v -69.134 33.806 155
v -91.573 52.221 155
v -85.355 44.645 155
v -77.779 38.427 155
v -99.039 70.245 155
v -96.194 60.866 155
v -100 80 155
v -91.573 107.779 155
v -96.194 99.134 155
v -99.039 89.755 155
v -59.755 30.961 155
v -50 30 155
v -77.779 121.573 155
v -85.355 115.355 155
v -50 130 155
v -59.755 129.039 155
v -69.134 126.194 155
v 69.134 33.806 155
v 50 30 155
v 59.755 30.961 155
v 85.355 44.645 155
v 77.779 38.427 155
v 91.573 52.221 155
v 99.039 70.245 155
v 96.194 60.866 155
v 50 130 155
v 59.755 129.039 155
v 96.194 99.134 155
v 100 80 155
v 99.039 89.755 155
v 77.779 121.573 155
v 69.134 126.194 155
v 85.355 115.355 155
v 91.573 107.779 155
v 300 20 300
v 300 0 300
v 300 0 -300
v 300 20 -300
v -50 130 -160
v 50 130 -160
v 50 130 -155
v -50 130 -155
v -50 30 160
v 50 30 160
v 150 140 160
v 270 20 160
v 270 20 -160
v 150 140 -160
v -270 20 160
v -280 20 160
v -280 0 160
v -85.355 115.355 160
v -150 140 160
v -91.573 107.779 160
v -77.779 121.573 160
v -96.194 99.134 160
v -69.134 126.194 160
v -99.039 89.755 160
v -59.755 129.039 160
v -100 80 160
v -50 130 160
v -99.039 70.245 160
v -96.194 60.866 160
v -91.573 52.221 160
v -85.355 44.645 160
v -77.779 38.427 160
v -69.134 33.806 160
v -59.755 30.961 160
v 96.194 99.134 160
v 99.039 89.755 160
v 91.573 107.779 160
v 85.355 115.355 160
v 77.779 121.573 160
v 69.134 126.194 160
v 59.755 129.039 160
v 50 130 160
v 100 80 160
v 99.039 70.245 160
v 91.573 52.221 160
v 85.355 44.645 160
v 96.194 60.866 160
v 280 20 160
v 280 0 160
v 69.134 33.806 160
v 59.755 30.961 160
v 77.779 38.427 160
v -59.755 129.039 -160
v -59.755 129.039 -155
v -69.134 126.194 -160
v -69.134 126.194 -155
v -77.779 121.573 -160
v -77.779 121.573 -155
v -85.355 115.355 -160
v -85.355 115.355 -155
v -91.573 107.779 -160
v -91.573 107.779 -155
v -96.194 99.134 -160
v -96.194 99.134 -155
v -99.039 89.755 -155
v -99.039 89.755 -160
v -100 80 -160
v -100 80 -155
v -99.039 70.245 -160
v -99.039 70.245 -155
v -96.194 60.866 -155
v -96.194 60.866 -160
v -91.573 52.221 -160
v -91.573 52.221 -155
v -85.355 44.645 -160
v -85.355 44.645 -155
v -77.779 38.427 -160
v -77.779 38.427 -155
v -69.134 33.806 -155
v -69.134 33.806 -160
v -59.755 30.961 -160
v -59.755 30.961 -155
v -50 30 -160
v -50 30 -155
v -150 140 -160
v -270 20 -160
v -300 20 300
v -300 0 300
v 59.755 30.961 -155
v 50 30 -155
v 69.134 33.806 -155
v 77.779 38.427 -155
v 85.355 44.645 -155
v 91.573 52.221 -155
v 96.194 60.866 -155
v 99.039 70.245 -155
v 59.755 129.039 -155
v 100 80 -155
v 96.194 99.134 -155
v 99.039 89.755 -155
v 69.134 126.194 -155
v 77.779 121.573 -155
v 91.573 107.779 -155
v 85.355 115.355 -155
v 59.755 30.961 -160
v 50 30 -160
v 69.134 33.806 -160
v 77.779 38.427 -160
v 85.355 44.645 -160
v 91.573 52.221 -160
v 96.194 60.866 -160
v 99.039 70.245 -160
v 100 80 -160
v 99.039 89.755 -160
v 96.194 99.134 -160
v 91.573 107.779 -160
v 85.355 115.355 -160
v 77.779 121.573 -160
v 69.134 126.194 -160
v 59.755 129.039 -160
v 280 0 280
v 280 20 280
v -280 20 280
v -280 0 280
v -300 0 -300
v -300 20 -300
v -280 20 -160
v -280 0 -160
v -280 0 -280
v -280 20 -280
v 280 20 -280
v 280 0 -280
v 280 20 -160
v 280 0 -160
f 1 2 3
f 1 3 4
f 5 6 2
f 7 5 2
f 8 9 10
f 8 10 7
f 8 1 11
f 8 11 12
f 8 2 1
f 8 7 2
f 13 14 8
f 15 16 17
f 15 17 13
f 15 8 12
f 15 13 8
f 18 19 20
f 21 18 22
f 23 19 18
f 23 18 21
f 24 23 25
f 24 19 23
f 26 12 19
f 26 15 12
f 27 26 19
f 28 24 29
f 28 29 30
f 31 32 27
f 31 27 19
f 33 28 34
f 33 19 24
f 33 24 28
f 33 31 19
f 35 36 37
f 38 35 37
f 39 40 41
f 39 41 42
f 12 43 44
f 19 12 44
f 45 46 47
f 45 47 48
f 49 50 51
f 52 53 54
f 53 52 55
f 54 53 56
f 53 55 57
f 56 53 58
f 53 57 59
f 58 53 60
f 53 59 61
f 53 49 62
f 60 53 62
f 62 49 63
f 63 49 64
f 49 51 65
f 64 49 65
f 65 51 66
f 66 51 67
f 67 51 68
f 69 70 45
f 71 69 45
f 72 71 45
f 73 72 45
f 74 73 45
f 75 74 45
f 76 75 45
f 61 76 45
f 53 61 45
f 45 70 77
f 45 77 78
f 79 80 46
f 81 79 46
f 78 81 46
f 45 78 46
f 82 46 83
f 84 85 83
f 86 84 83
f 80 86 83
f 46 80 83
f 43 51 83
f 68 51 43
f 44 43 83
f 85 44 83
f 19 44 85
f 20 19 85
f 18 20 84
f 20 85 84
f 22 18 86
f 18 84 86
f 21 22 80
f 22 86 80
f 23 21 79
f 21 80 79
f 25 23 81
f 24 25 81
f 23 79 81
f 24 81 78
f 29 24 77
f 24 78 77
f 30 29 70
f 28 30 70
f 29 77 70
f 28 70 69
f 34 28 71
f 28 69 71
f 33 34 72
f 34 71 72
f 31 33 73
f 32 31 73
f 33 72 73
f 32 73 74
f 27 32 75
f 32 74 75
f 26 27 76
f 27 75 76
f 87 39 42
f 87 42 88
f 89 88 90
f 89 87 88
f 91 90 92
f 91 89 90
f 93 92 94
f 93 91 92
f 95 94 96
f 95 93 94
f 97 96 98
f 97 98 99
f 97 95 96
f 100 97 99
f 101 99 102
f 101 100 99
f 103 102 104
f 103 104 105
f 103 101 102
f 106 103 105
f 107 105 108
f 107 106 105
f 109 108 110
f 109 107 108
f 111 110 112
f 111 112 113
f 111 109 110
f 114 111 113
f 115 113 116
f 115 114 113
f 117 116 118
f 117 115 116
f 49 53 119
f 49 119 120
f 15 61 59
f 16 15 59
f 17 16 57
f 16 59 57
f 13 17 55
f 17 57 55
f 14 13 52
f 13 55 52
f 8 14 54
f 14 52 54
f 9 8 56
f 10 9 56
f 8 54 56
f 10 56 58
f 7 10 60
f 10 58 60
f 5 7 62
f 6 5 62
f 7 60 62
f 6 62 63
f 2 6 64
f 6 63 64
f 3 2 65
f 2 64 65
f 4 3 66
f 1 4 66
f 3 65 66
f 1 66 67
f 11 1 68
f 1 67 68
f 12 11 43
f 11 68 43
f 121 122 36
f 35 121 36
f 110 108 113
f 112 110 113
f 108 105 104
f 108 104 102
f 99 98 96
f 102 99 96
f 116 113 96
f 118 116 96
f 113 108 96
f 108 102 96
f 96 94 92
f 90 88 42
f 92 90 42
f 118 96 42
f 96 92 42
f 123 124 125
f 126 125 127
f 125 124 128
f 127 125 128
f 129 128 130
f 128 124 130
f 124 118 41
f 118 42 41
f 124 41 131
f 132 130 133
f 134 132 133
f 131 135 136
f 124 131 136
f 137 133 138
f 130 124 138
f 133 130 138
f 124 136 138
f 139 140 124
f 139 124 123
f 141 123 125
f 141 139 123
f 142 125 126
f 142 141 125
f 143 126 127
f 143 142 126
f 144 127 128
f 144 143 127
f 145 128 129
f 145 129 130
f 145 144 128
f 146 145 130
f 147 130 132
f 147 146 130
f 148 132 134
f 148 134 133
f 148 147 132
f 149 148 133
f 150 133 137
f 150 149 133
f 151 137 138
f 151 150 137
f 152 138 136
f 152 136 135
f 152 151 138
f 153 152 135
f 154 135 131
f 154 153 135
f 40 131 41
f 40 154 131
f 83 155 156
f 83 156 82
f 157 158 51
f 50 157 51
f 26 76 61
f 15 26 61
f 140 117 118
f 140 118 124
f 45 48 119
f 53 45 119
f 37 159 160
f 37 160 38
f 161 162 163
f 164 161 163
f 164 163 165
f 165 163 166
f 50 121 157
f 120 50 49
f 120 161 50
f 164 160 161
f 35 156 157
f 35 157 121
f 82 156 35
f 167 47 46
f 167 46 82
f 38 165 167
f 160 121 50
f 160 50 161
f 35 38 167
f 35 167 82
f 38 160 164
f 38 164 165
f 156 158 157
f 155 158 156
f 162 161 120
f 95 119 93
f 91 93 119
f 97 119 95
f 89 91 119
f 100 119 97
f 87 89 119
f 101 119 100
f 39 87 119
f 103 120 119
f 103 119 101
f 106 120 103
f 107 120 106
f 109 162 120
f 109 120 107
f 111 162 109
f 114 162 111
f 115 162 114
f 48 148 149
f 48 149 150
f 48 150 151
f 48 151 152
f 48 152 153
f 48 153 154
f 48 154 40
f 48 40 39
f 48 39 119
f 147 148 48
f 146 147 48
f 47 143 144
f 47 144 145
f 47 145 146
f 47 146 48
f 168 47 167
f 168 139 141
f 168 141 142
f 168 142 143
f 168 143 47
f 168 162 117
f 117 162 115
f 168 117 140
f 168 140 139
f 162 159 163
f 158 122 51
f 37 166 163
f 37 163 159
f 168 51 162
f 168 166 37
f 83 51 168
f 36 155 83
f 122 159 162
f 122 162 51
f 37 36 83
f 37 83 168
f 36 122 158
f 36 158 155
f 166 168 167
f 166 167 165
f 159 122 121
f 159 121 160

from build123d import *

# Parameters (mm, degrees)
SKETCH_1_W          = 600
SKETCH_1_H          = 600
SKETCH_1_W_2        = 560
SKETCH_1_H_2        = 120
EXTRUDE_1_DEPTH     = 20
EXTRUDE_2_DEPTH     = 320
CUT_EXTRUDE_1_DEPTH = 5
CUT_EXTRUDE_START   = -320
CUT_EXTRUDE_3_DEPTH = 5


with BuildPart() as part:
    # 草图1 → 凸台-拉伸1 (new body)
    with BuildSketch(Plane(origin=(0, 0, 0), x_dir=(1, 0, 0), z_dir=(0, 1, 0))):
        Rectangle(SKETCH_1_W, SKETCH_1_H)
        with Locations((0, 220)):
            Rectangle(SKETCH_1_W_2, SKETCH_1_H_2, mode=Mode.SUBTRACT)
        with Locations((0, -220)):
            Rectangle(SKETCH_1_W_2, SKETCH_1_H_2, mode=Mode.SUBTRACT)
    extrude(amount=EXTRUDE_1_DEPTH)

    # 草图2 → 凸台-拉伸2 (add)
    with BuildSketch(Plane.XY.offset(160)):
        Polygon((-270, 20), (-270, 0), (270, 0), (270, 20), (150, 140), (-150, 140), align=None)
    extrude(amount=-EXTRUDE_2_DEPTH)

    # 草图3 → 切除-拉伸1 (cut)
    with BuildSketch(Plane.XY.offset(160)):
        with BuildLine():
            Line((50, 130), (-50, 130))
            ThreePointArc((-50, 130), (-100, 80), (-50, 30))
            Line((-50, 30), (50, 30))
            ThreePointArc((50, 30), (100, 80), (50, 130))
        make_face()
    extrude(amount=-CUT_EXTRUDE_1_DEPTH, mode=Mode.SUBTRACT)

    # 草图3<3> → 切除-拉伸3 (cut)
    with BuildSketch(Plane.XY.offset(160).offset(CUT_EXTRUDE_START)):
        with BuildLine():
            Line((50, 130), (-50, 130))
            ThreePointArc((-50, 130), (-100, 80), (-50, 30))
            Line((-50, 30), (50, 30))
            ThreePointArc((50, 30), (100, 80), (50, 130))
        make_face()
    extrude(amount=CUT_EXTRUDE_3_DEPTH, mode=Mode.SUBTRACT)


solid = part.part
